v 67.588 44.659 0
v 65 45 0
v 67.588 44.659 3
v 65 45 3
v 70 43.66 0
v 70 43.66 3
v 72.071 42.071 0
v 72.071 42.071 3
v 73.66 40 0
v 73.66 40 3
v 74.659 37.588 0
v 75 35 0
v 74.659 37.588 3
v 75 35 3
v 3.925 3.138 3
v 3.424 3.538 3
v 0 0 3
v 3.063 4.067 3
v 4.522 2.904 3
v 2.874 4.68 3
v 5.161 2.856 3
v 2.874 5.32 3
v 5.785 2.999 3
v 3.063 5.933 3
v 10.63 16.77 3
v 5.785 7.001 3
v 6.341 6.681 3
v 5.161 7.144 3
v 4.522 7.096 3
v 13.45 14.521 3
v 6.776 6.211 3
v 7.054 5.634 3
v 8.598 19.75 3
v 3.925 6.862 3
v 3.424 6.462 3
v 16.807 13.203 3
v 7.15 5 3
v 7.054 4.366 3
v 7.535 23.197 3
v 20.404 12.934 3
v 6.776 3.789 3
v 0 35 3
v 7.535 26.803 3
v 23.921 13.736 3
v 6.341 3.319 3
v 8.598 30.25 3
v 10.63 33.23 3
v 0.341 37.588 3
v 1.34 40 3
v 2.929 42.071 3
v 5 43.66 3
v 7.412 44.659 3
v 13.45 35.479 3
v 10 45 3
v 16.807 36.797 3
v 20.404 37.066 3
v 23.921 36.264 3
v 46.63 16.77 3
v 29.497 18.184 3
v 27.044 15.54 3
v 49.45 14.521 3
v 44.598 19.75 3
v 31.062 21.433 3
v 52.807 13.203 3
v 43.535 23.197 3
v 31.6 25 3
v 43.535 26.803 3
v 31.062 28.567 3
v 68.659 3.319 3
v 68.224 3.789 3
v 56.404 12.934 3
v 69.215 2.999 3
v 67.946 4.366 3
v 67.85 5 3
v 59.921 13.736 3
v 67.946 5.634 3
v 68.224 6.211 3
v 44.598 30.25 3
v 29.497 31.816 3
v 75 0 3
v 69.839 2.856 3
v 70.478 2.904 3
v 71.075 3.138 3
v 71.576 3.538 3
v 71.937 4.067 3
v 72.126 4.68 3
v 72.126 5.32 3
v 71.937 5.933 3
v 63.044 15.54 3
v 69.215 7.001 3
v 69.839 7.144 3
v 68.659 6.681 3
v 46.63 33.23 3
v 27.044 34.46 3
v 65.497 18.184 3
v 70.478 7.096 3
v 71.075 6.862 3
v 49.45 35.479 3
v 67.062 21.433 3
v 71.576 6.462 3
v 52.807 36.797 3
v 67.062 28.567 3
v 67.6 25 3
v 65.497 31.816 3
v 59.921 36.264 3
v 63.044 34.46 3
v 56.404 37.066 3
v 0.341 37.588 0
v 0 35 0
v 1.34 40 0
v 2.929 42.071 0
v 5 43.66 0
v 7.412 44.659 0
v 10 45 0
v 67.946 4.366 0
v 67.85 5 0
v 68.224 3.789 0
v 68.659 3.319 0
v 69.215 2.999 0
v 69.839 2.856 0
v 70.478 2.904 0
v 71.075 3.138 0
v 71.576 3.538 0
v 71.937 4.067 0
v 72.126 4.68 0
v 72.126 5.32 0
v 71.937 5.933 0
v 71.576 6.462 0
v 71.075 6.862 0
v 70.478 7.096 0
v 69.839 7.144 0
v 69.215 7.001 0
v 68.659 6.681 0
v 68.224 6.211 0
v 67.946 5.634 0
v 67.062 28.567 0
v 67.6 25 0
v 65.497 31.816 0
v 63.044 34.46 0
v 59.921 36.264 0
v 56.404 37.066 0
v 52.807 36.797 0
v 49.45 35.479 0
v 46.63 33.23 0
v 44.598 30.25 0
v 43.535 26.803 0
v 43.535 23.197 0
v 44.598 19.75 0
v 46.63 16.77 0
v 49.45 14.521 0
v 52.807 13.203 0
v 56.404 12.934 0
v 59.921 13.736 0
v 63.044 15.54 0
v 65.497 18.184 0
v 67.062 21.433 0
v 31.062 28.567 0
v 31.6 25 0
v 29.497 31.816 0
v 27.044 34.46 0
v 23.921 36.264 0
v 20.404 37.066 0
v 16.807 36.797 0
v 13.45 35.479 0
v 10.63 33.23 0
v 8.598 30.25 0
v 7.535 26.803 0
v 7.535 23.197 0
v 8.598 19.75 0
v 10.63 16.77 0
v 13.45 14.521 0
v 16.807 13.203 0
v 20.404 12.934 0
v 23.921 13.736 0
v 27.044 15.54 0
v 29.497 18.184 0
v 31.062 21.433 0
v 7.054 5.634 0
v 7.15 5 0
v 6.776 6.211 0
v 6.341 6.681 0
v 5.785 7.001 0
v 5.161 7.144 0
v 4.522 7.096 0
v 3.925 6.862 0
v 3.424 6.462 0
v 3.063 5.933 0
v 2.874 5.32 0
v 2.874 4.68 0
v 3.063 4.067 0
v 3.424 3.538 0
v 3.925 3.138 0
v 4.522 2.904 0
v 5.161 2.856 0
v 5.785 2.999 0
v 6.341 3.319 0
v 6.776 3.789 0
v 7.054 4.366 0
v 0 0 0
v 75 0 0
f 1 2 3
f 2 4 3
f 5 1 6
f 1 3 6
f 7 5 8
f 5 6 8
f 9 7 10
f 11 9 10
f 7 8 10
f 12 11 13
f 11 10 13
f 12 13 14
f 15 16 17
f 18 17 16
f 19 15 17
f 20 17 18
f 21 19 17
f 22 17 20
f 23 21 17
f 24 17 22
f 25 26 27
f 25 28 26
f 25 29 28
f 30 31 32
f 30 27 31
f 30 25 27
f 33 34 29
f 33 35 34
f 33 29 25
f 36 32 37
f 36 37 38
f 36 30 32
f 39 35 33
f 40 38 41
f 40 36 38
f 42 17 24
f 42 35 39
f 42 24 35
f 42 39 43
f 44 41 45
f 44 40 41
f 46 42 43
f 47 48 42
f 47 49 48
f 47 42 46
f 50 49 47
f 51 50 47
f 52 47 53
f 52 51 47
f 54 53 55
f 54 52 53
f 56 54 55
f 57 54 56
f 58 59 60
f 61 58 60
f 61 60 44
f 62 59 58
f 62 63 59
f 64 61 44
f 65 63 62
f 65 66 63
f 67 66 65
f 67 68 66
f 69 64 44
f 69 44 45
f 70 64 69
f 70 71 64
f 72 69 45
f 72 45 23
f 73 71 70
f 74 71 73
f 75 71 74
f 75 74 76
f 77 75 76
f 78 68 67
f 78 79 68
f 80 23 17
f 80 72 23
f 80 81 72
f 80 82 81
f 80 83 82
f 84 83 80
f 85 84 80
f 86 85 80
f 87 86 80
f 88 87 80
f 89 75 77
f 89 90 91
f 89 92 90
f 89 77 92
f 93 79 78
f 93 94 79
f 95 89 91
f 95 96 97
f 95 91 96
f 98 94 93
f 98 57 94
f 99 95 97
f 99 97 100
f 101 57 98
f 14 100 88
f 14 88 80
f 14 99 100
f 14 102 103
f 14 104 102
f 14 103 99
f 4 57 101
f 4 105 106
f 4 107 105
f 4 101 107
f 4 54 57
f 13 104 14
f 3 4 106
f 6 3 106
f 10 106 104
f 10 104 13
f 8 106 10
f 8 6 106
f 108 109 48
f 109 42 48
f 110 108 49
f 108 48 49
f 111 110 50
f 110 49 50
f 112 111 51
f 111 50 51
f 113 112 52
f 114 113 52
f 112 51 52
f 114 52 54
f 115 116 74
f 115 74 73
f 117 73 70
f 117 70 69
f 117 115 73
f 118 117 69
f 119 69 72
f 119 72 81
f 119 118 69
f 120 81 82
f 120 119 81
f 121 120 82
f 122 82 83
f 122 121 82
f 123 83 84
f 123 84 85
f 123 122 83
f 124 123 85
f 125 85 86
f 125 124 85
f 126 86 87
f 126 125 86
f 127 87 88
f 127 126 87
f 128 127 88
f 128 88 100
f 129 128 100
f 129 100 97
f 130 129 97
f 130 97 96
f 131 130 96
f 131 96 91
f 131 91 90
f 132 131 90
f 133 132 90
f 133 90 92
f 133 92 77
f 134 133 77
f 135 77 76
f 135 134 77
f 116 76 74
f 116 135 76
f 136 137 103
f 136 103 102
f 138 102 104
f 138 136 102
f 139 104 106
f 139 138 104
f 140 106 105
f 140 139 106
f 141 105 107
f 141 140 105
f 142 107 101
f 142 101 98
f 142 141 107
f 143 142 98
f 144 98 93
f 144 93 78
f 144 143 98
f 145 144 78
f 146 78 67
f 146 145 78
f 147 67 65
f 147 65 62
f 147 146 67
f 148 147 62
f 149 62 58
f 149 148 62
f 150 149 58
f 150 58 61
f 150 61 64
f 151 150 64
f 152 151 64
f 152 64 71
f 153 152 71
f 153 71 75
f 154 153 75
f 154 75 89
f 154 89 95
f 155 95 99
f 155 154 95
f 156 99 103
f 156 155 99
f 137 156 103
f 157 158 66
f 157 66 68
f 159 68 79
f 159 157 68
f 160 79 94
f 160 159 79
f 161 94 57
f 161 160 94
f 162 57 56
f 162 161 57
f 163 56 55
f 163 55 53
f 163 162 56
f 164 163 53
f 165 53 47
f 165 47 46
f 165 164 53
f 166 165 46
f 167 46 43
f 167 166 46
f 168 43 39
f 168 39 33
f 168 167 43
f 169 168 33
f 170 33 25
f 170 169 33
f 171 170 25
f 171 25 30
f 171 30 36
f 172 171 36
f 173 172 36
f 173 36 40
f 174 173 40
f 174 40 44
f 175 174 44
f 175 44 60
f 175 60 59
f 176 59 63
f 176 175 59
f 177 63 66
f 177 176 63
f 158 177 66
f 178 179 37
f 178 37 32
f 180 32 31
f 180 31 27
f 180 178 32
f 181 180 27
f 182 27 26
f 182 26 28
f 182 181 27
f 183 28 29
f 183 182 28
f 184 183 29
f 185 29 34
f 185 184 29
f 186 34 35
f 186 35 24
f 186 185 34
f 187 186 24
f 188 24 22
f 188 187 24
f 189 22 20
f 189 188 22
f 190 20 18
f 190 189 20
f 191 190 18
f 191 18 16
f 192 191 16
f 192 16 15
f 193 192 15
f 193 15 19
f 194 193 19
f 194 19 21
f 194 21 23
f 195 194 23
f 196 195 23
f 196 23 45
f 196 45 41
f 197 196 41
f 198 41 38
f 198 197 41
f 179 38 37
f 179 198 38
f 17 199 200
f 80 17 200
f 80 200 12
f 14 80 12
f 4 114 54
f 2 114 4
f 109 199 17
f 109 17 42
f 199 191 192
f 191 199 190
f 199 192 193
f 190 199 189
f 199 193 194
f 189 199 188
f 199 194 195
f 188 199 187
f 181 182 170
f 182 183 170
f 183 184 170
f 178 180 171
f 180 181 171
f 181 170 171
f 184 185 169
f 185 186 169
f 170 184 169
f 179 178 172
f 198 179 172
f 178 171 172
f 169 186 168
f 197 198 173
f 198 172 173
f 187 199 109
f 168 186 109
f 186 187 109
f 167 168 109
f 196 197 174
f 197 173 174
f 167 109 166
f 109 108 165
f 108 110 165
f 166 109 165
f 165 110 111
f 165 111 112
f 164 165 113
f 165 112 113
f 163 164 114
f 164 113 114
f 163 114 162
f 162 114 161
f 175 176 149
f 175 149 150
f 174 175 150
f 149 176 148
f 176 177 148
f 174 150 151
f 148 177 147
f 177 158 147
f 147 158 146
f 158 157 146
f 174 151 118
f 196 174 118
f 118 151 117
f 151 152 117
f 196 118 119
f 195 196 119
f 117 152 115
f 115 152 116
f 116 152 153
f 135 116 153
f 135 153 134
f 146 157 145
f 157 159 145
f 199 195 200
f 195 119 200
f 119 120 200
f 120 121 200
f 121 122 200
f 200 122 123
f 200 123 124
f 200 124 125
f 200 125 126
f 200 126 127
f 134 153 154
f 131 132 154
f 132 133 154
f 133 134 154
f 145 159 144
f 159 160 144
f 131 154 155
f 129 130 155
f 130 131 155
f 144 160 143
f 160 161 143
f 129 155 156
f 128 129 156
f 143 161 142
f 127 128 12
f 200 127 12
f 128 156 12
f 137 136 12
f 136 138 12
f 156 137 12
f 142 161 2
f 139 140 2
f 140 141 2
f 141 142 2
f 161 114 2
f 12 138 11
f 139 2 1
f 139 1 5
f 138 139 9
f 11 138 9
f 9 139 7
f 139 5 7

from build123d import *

# Parameters (mm, degrees)
SKETCH_1_W      = 75
SKETCH_1_H      = 45
SKETCH_1_R      = 12.1
SKETCH_1_R_2    = 2.15
EXTRUDE_1_DEPTH = 3
FILLET_1_R      = 10


with BuildPart() as part:
    # ｽｹｯﾁ1 → ﾎﾞｽ - 押し出し1 (new body)
    with BuildSketch(Plane.XY):
        with Locations((37.5, 22.5)):
            Rectangle(SKETCH_1_W, SKETCH_1_H)
        with Locations((19.5, 25)):
            Circle(SKETCH_1_R, mode=Mode.SUBTRACT)
        with Locations((55.5, 25)):
            Circle(SKETCH_1_R, mode=Mode.SUBTRACT)
        with Locations((5, 5)):
            Circle(SKETCH_1_R_2, mode=Mode.SUBTRACT)
        with Locations(Location((70, 5, 0), (0, 0, 180))):
            Circle(SKETCH_1_R_2, mode=Mode.SUBTRACT)
    extrude(amount=EXTRUDE_1_DEPTH)

    # ﾌｨﾚｯﾄ1
    fillet_1_edges = [part.edges().sort_by_distance(p)[0] for p in [
        (0, 45, 1.5),
        (75, 45, 1.5),
    ]]
    fillet(fillet_1_edges, radius=FILLET_1_R)


solid = part.part
